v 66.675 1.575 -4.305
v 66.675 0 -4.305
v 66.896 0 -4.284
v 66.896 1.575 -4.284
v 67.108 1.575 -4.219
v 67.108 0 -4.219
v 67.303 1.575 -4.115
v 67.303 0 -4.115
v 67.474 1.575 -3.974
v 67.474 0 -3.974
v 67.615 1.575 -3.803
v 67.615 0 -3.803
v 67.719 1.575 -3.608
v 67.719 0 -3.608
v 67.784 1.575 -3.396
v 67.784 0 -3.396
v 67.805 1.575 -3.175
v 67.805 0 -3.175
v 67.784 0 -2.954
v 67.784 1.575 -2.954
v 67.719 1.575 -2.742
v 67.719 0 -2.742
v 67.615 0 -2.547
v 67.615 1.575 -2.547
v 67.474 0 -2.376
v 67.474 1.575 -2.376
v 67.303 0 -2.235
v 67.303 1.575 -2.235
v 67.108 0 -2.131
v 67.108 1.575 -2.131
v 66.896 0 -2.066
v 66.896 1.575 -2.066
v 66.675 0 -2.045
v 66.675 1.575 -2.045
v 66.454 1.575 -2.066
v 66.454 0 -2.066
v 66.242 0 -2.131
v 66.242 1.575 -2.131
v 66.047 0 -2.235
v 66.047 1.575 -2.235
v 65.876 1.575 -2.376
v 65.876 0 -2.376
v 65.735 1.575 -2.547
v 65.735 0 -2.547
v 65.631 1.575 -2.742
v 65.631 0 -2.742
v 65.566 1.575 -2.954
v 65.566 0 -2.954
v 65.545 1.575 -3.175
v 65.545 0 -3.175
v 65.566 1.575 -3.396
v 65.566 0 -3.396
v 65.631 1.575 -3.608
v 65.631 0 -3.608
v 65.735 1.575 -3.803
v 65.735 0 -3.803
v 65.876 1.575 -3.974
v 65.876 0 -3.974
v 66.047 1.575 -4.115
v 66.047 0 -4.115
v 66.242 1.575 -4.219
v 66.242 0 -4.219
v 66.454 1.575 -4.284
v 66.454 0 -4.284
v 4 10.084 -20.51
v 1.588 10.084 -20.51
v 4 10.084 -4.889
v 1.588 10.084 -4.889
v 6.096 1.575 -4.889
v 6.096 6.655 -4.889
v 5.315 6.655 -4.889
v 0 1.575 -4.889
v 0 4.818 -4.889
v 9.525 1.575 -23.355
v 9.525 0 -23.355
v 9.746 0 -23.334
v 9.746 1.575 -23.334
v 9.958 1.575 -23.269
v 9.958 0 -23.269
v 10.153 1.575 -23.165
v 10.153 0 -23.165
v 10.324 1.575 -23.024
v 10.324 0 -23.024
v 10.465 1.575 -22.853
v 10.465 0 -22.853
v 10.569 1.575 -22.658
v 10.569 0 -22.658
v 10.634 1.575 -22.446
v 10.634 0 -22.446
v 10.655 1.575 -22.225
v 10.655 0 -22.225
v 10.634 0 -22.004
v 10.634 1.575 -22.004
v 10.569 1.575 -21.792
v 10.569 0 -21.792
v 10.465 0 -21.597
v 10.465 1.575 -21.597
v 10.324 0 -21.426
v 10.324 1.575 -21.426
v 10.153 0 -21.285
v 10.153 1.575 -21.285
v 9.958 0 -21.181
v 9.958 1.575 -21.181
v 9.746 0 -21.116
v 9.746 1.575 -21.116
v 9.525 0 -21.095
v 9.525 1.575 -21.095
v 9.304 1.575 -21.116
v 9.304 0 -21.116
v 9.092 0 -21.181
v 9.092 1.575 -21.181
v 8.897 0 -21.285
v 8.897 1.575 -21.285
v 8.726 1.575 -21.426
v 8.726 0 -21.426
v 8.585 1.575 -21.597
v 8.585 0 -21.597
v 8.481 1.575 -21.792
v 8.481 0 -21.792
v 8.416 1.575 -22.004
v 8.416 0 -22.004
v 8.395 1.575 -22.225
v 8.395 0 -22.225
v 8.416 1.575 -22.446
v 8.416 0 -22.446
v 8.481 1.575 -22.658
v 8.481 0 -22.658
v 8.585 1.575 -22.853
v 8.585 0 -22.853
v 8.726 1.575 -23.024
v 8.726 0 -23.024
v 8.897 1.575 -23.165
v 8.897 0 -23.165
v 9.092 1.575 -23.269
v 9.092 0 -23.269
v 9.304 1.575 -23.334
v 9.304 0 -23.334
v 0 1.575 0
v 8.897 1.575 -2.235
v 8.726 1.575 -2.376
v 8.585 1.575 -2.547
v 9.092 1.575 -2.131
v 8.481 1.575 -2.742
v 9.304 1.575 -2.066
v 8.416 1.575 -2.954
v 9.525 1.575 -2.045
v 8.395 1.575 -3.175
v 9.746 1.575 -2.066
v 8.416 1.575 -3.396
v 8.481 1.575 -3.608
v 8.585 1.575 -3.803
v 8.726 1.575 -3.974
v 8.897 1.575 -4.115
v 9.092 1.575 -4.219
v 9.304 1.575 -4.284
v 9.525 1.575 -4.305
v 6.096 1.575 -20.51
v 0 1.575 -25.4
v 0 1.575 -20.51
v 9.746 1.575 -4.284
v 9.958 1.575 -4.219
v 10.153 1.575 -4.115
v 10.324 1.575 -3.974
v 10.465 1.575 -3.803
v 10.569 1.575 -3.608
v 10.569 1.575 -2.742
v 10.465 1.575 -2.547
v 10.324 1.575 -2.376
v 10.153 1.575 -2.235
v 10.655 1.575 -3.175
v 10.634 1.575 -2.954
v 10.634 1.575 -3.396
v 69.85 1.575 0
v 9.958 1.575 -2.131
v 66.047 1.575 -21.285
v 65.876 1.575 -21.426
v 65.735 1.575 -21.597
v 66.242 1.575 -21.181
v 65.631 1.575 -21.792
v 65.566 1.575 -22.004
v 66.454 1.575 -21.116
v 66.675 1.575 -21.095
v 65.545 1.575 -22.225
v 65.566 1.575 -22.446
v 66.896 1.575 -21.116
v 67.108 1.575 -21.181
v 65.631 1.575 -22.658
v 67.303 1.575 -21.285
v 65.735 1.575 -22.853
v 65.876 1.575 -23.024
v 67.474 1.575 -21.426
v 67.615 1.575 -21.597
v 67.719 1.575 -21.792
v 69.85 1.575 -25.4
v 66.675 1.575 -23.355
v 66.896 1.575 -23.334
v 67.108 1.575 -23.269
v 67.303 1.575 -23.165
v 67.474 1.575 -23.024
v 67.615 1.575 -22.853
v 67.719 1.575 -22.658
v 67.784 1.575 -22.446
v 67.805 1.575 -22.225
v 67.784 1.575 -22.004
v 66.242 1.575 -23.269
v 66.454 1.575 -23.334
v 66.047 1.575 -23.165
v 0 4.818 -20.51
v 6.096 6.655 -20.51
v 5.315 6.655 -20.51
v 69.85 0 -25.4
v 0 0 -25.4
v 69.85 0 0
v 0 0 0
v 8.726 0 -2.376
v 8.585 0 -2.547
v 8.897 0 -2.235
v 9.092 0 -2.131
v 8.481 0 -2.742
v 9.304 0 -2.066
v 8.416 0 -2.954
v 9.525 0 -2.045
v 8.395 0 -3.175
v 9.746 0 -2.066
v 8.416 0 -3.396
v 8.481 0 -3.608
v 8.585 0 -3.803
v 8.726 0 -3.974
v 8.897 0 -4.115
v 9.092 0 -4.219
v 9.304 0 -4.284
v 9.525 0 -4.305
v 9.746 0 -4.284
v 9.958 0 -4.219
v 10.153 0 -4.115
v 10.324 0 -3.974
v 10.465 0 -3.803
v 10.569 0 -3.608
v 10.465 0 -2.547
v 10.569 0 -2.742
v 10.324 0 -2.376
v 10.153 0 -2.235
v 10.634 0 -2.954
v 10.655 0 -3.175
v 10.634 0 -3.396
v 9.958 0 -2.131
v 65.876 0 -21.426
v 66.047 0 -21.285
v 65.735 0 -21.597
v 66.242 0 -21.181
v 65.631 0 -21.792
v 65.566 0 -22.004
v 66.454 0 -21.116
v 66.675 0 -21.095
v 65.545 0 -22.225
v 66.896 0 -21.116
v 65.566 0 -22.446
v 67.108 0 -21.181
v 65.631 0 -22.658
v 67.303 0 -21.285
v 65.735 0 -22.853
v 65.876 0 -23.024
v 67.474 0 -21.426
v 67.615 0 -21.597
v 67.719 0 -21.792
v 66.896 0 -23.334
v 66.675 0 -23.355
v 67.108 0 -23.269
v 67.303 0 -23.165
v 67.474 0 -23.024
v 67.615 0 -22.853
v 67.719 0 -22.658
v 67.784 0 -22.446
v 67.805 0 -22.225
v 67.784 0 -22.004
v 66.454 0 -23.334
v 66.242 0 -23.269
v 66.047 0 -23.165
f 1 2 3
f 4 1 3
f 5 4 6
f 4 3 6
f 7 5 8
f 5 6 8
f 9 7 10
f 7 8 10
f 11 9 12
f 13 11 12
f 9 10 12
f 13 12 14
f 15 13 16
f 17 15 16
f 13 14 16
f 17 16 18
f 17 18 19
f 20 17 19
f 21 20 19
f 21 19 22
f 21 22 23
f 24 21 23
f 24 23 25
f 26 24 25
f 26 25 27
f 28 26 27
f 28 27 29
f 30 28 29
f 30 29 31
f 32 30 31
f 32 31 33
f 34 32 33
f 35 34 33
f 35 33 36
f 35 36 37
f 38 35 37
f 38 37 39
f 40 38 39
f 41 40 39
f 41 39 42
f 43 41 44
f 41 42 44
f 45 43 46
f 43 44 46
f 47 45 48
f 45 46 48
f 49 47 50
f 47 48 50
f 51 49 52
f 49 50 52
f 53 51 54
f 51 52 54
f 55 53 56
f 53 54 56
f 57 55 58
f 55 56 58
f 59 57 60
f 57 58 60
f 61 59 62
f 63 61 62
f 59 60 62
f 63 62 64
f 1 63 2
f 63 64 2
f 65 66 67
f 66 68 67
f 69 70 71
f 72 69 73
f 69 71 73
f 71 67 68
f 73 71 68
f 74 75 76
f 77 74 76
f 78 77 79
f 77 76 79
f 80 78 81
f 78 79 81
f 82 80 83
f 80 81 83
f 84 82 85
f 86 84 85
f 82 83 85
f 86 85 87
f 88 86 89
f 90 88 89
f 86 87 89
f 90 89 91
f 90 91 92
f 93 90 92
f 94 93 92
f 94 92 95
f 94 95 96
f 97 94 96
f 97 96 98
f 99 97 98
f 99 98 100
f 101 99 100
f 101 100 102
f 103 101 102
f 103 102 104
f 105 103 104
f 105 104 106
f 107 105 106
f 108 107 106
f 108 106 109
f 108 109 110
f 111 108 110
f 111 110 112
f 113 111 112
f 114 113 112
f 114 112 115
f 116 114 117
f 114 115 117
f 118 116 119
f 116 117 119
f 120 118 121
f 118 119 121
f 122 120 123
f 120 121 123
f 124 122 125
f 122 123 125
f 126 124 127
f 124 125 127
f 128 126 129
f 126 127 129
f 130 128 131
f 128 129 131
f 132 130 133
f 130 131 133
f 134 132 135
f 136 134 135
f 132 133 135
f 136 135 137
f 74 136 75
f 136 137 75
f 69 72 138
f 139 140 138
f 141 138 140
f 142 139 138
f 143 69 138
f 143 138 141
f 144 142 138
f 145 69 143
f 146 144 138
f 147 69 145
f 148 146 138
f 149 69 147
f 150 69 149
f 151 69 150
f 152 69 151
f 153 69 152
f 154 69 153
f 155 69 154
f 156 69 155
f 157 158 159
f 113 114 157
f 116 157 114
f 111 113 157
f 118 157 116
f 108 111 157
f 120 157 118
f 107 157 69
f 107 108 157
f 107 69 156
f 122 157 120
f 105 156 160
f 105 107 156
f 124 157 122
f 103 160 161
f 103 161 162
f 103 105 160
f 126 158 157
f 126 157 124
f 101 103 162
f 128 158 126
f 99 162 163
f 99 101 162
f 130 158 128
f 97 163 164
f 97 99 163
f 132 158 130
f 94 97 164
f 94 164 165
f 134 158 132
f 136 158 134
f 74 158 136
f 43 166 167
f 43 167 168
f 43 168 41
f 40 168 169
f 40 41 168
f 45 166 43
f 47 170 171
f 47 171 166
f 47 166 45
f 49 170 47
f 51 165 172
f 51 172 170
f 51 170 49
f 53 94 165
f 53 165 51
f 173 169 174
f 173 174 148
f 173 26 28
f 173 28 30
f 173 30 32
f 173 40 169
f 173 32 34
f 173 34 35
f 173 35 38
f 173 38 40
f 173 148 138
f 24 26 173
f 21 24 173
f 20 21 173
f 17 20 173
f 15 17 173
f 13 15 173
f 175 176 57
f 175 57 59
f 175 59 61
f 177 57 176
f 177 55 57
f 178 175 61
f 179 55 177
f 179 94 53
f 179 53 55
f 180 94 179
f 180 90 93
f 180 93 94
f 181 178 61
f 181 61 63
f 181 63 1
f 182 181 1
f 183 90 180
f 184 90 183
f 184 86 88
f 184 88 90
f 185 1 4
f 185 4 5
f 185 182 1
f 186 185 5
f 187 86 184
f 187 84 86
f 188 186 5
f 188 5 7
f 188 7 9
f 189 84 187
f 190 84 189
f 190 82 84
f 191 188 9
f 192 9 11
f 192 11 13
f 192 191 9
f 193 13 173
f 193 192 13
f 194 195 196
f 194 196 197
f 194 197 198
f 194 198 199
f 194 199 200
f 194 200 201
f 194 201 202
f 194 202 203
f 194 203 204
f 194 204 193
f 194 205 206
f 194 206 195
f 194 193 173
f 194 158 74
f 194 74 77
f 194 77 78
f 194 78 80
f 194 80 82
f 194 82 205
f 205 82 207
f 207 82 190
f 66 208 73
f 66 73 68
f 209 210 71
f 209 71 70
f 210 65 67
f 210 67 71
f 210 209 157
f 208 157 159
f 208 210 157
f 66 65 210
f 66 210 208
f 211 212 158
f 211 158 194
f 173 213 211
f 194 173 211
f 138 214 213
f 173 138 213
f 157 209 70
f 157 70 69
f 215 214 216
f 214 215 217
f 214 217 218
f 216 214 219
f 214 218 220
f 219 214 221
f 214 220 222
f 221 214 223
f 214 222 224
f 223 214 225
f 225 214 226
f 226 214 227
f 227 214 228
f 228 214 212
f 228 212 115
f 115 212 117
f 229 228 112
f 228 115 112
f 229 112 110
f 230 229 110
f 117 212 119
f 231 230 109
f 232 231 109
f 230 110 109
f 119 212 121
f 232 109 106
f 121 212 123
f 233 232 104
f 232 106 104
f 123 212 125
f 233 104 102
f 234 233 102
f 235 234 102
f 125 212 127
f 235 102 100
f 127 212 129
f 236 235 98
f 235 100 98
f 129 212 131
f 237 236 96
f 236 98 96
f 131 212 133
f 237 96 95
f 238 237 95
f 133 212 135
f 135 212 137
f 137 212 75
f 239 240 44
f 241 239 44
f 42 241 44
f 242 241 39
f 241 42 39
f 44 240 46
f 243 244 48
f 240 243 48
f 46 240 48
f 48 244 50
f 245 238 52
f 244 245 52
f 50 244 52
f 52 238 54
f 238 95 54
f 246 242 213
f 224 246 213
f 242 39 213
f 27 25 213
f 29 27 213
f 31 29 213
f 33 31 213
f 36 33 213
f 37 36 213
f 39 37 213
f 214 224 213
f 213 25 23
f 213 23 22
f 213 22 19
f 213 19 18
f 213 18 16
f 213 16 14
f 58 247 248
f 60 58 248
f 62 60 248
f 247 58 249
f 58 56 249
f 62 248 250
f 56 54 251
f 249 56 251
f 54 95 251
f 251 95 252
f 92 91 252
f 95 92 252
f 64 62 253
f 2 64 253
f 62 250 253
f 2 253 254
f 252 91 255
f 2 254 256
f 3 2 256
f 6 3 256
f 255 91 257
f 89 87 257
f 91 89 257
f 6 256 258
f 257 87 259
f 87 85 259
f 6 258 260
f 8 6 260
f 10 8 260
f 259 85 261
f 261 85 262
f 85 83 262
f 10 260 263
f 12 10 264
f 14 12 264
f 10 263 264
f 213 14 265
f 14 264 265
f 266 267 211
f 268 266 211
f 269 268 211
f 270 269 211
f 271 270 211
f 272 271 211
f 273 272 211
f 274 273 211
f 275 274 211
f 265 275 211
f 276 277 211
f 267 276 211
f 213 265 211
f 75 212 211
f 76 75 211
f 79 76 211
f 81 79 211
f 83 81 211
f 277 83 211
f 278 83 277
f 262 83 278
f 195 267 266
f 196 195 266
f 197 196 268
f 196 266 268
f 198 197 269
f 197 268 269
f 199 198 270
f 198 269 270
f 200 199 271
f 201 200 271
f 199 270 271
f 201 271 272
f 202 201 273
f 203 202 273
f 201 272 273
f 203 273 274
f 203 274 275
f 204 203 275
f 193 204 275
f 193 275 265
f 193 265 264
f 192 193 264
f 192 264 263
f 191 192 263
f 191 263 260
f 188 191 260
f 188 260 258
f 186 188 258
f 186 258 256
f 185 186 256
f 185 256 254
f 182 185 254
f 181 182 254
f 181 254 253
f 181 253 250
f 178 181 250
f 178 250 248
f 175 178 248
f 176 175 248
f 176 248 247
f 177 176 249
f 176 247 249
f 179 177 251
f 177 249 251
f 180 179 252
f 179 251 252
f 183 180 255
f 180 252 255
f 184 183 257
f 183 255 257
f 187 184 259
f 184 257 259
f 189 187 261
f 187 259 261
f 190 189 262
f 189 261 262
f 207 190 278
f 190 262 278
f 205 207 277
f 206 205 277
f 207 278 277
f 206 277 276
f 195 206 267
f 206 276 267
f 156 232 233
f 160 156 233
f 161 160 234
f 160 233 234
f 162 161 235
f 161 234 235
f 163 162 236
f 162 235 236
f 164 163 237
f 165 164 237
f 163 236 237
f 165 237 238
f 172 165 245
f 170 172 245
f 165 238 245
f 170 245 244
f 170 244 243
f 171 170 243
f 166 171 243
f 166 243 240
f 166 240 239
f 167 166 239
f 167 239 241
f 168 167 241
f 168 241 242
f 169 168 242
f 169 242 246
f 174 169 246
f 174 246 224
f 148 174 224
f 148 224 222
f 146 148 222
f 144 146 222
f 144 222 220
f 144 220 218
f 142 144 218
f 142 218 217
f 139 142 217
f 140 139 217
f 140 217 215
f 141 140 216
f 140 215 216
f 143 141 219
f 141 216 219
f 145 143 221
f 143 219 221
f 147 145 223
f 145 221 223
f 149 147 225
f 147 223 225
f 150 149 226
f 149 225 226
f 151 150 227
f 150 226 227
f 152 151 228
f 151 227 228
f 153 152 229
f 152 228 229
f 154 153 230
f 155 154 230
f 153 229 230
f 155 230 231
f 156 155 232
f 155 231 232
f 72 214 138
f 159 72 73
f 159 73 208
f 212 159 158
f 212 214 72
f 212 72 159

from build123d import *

# Parameters (mm, degrees)
SKETCH2_W                 = 69.85
SKETCH2_H                 = 25.4
BOSS_EXTRUDE1_DEPTH       = 1.5748
TAP_DRILL_FOR_4_40_TAP1_D = 2.2606
BOSS_EXTRUDE2_DEPTH       = 7.8105


with BuildPart() as part:
    # Sketch2 → Boss-Extrude1 (new body)
    with BuildSketch(Plane(origin=(0, 0, 0), x_dir=(1, 0, 0), z_dir=(0, 1, 0))):
        with Locations((34.925, 12.7)):
            Rectangle(SKETCH2_W, SKETCH2_H)
    extrude(amount=BOSS_EXTRUDE1_DEPTH)

    # Tap Drill for #4-40 Tap1 (through all)
    with Locations(Plane(origin=(9.525, 1.5748, -22.225), x_dir=(0, 0, 1), z_dir=(0, 1, 0))):
        with Locations((0, 0), (19.05, 0), (19.05, 57.15), (0, 57.15)):
            Hole(TAP_DRILL_FOR_4_40_TAP1_D / 2)

    # Sketch4 → Boss-Extrude2 (add, symmetric)
    with BuildSketch(Plane.XY.offset(-12.7)):
        Polygon((0, 1.5748), (0, 4.817906029), (1.588475565, 10.0838), (3.999524435, 10.0838), (5.314976691, 6.6548), (6.096, 6.6548), (6.096, 1.5748), align=None)
    extrude(amount=BOSS_EXTRUDE2_DEPTH, both=True)


solid = part.part
